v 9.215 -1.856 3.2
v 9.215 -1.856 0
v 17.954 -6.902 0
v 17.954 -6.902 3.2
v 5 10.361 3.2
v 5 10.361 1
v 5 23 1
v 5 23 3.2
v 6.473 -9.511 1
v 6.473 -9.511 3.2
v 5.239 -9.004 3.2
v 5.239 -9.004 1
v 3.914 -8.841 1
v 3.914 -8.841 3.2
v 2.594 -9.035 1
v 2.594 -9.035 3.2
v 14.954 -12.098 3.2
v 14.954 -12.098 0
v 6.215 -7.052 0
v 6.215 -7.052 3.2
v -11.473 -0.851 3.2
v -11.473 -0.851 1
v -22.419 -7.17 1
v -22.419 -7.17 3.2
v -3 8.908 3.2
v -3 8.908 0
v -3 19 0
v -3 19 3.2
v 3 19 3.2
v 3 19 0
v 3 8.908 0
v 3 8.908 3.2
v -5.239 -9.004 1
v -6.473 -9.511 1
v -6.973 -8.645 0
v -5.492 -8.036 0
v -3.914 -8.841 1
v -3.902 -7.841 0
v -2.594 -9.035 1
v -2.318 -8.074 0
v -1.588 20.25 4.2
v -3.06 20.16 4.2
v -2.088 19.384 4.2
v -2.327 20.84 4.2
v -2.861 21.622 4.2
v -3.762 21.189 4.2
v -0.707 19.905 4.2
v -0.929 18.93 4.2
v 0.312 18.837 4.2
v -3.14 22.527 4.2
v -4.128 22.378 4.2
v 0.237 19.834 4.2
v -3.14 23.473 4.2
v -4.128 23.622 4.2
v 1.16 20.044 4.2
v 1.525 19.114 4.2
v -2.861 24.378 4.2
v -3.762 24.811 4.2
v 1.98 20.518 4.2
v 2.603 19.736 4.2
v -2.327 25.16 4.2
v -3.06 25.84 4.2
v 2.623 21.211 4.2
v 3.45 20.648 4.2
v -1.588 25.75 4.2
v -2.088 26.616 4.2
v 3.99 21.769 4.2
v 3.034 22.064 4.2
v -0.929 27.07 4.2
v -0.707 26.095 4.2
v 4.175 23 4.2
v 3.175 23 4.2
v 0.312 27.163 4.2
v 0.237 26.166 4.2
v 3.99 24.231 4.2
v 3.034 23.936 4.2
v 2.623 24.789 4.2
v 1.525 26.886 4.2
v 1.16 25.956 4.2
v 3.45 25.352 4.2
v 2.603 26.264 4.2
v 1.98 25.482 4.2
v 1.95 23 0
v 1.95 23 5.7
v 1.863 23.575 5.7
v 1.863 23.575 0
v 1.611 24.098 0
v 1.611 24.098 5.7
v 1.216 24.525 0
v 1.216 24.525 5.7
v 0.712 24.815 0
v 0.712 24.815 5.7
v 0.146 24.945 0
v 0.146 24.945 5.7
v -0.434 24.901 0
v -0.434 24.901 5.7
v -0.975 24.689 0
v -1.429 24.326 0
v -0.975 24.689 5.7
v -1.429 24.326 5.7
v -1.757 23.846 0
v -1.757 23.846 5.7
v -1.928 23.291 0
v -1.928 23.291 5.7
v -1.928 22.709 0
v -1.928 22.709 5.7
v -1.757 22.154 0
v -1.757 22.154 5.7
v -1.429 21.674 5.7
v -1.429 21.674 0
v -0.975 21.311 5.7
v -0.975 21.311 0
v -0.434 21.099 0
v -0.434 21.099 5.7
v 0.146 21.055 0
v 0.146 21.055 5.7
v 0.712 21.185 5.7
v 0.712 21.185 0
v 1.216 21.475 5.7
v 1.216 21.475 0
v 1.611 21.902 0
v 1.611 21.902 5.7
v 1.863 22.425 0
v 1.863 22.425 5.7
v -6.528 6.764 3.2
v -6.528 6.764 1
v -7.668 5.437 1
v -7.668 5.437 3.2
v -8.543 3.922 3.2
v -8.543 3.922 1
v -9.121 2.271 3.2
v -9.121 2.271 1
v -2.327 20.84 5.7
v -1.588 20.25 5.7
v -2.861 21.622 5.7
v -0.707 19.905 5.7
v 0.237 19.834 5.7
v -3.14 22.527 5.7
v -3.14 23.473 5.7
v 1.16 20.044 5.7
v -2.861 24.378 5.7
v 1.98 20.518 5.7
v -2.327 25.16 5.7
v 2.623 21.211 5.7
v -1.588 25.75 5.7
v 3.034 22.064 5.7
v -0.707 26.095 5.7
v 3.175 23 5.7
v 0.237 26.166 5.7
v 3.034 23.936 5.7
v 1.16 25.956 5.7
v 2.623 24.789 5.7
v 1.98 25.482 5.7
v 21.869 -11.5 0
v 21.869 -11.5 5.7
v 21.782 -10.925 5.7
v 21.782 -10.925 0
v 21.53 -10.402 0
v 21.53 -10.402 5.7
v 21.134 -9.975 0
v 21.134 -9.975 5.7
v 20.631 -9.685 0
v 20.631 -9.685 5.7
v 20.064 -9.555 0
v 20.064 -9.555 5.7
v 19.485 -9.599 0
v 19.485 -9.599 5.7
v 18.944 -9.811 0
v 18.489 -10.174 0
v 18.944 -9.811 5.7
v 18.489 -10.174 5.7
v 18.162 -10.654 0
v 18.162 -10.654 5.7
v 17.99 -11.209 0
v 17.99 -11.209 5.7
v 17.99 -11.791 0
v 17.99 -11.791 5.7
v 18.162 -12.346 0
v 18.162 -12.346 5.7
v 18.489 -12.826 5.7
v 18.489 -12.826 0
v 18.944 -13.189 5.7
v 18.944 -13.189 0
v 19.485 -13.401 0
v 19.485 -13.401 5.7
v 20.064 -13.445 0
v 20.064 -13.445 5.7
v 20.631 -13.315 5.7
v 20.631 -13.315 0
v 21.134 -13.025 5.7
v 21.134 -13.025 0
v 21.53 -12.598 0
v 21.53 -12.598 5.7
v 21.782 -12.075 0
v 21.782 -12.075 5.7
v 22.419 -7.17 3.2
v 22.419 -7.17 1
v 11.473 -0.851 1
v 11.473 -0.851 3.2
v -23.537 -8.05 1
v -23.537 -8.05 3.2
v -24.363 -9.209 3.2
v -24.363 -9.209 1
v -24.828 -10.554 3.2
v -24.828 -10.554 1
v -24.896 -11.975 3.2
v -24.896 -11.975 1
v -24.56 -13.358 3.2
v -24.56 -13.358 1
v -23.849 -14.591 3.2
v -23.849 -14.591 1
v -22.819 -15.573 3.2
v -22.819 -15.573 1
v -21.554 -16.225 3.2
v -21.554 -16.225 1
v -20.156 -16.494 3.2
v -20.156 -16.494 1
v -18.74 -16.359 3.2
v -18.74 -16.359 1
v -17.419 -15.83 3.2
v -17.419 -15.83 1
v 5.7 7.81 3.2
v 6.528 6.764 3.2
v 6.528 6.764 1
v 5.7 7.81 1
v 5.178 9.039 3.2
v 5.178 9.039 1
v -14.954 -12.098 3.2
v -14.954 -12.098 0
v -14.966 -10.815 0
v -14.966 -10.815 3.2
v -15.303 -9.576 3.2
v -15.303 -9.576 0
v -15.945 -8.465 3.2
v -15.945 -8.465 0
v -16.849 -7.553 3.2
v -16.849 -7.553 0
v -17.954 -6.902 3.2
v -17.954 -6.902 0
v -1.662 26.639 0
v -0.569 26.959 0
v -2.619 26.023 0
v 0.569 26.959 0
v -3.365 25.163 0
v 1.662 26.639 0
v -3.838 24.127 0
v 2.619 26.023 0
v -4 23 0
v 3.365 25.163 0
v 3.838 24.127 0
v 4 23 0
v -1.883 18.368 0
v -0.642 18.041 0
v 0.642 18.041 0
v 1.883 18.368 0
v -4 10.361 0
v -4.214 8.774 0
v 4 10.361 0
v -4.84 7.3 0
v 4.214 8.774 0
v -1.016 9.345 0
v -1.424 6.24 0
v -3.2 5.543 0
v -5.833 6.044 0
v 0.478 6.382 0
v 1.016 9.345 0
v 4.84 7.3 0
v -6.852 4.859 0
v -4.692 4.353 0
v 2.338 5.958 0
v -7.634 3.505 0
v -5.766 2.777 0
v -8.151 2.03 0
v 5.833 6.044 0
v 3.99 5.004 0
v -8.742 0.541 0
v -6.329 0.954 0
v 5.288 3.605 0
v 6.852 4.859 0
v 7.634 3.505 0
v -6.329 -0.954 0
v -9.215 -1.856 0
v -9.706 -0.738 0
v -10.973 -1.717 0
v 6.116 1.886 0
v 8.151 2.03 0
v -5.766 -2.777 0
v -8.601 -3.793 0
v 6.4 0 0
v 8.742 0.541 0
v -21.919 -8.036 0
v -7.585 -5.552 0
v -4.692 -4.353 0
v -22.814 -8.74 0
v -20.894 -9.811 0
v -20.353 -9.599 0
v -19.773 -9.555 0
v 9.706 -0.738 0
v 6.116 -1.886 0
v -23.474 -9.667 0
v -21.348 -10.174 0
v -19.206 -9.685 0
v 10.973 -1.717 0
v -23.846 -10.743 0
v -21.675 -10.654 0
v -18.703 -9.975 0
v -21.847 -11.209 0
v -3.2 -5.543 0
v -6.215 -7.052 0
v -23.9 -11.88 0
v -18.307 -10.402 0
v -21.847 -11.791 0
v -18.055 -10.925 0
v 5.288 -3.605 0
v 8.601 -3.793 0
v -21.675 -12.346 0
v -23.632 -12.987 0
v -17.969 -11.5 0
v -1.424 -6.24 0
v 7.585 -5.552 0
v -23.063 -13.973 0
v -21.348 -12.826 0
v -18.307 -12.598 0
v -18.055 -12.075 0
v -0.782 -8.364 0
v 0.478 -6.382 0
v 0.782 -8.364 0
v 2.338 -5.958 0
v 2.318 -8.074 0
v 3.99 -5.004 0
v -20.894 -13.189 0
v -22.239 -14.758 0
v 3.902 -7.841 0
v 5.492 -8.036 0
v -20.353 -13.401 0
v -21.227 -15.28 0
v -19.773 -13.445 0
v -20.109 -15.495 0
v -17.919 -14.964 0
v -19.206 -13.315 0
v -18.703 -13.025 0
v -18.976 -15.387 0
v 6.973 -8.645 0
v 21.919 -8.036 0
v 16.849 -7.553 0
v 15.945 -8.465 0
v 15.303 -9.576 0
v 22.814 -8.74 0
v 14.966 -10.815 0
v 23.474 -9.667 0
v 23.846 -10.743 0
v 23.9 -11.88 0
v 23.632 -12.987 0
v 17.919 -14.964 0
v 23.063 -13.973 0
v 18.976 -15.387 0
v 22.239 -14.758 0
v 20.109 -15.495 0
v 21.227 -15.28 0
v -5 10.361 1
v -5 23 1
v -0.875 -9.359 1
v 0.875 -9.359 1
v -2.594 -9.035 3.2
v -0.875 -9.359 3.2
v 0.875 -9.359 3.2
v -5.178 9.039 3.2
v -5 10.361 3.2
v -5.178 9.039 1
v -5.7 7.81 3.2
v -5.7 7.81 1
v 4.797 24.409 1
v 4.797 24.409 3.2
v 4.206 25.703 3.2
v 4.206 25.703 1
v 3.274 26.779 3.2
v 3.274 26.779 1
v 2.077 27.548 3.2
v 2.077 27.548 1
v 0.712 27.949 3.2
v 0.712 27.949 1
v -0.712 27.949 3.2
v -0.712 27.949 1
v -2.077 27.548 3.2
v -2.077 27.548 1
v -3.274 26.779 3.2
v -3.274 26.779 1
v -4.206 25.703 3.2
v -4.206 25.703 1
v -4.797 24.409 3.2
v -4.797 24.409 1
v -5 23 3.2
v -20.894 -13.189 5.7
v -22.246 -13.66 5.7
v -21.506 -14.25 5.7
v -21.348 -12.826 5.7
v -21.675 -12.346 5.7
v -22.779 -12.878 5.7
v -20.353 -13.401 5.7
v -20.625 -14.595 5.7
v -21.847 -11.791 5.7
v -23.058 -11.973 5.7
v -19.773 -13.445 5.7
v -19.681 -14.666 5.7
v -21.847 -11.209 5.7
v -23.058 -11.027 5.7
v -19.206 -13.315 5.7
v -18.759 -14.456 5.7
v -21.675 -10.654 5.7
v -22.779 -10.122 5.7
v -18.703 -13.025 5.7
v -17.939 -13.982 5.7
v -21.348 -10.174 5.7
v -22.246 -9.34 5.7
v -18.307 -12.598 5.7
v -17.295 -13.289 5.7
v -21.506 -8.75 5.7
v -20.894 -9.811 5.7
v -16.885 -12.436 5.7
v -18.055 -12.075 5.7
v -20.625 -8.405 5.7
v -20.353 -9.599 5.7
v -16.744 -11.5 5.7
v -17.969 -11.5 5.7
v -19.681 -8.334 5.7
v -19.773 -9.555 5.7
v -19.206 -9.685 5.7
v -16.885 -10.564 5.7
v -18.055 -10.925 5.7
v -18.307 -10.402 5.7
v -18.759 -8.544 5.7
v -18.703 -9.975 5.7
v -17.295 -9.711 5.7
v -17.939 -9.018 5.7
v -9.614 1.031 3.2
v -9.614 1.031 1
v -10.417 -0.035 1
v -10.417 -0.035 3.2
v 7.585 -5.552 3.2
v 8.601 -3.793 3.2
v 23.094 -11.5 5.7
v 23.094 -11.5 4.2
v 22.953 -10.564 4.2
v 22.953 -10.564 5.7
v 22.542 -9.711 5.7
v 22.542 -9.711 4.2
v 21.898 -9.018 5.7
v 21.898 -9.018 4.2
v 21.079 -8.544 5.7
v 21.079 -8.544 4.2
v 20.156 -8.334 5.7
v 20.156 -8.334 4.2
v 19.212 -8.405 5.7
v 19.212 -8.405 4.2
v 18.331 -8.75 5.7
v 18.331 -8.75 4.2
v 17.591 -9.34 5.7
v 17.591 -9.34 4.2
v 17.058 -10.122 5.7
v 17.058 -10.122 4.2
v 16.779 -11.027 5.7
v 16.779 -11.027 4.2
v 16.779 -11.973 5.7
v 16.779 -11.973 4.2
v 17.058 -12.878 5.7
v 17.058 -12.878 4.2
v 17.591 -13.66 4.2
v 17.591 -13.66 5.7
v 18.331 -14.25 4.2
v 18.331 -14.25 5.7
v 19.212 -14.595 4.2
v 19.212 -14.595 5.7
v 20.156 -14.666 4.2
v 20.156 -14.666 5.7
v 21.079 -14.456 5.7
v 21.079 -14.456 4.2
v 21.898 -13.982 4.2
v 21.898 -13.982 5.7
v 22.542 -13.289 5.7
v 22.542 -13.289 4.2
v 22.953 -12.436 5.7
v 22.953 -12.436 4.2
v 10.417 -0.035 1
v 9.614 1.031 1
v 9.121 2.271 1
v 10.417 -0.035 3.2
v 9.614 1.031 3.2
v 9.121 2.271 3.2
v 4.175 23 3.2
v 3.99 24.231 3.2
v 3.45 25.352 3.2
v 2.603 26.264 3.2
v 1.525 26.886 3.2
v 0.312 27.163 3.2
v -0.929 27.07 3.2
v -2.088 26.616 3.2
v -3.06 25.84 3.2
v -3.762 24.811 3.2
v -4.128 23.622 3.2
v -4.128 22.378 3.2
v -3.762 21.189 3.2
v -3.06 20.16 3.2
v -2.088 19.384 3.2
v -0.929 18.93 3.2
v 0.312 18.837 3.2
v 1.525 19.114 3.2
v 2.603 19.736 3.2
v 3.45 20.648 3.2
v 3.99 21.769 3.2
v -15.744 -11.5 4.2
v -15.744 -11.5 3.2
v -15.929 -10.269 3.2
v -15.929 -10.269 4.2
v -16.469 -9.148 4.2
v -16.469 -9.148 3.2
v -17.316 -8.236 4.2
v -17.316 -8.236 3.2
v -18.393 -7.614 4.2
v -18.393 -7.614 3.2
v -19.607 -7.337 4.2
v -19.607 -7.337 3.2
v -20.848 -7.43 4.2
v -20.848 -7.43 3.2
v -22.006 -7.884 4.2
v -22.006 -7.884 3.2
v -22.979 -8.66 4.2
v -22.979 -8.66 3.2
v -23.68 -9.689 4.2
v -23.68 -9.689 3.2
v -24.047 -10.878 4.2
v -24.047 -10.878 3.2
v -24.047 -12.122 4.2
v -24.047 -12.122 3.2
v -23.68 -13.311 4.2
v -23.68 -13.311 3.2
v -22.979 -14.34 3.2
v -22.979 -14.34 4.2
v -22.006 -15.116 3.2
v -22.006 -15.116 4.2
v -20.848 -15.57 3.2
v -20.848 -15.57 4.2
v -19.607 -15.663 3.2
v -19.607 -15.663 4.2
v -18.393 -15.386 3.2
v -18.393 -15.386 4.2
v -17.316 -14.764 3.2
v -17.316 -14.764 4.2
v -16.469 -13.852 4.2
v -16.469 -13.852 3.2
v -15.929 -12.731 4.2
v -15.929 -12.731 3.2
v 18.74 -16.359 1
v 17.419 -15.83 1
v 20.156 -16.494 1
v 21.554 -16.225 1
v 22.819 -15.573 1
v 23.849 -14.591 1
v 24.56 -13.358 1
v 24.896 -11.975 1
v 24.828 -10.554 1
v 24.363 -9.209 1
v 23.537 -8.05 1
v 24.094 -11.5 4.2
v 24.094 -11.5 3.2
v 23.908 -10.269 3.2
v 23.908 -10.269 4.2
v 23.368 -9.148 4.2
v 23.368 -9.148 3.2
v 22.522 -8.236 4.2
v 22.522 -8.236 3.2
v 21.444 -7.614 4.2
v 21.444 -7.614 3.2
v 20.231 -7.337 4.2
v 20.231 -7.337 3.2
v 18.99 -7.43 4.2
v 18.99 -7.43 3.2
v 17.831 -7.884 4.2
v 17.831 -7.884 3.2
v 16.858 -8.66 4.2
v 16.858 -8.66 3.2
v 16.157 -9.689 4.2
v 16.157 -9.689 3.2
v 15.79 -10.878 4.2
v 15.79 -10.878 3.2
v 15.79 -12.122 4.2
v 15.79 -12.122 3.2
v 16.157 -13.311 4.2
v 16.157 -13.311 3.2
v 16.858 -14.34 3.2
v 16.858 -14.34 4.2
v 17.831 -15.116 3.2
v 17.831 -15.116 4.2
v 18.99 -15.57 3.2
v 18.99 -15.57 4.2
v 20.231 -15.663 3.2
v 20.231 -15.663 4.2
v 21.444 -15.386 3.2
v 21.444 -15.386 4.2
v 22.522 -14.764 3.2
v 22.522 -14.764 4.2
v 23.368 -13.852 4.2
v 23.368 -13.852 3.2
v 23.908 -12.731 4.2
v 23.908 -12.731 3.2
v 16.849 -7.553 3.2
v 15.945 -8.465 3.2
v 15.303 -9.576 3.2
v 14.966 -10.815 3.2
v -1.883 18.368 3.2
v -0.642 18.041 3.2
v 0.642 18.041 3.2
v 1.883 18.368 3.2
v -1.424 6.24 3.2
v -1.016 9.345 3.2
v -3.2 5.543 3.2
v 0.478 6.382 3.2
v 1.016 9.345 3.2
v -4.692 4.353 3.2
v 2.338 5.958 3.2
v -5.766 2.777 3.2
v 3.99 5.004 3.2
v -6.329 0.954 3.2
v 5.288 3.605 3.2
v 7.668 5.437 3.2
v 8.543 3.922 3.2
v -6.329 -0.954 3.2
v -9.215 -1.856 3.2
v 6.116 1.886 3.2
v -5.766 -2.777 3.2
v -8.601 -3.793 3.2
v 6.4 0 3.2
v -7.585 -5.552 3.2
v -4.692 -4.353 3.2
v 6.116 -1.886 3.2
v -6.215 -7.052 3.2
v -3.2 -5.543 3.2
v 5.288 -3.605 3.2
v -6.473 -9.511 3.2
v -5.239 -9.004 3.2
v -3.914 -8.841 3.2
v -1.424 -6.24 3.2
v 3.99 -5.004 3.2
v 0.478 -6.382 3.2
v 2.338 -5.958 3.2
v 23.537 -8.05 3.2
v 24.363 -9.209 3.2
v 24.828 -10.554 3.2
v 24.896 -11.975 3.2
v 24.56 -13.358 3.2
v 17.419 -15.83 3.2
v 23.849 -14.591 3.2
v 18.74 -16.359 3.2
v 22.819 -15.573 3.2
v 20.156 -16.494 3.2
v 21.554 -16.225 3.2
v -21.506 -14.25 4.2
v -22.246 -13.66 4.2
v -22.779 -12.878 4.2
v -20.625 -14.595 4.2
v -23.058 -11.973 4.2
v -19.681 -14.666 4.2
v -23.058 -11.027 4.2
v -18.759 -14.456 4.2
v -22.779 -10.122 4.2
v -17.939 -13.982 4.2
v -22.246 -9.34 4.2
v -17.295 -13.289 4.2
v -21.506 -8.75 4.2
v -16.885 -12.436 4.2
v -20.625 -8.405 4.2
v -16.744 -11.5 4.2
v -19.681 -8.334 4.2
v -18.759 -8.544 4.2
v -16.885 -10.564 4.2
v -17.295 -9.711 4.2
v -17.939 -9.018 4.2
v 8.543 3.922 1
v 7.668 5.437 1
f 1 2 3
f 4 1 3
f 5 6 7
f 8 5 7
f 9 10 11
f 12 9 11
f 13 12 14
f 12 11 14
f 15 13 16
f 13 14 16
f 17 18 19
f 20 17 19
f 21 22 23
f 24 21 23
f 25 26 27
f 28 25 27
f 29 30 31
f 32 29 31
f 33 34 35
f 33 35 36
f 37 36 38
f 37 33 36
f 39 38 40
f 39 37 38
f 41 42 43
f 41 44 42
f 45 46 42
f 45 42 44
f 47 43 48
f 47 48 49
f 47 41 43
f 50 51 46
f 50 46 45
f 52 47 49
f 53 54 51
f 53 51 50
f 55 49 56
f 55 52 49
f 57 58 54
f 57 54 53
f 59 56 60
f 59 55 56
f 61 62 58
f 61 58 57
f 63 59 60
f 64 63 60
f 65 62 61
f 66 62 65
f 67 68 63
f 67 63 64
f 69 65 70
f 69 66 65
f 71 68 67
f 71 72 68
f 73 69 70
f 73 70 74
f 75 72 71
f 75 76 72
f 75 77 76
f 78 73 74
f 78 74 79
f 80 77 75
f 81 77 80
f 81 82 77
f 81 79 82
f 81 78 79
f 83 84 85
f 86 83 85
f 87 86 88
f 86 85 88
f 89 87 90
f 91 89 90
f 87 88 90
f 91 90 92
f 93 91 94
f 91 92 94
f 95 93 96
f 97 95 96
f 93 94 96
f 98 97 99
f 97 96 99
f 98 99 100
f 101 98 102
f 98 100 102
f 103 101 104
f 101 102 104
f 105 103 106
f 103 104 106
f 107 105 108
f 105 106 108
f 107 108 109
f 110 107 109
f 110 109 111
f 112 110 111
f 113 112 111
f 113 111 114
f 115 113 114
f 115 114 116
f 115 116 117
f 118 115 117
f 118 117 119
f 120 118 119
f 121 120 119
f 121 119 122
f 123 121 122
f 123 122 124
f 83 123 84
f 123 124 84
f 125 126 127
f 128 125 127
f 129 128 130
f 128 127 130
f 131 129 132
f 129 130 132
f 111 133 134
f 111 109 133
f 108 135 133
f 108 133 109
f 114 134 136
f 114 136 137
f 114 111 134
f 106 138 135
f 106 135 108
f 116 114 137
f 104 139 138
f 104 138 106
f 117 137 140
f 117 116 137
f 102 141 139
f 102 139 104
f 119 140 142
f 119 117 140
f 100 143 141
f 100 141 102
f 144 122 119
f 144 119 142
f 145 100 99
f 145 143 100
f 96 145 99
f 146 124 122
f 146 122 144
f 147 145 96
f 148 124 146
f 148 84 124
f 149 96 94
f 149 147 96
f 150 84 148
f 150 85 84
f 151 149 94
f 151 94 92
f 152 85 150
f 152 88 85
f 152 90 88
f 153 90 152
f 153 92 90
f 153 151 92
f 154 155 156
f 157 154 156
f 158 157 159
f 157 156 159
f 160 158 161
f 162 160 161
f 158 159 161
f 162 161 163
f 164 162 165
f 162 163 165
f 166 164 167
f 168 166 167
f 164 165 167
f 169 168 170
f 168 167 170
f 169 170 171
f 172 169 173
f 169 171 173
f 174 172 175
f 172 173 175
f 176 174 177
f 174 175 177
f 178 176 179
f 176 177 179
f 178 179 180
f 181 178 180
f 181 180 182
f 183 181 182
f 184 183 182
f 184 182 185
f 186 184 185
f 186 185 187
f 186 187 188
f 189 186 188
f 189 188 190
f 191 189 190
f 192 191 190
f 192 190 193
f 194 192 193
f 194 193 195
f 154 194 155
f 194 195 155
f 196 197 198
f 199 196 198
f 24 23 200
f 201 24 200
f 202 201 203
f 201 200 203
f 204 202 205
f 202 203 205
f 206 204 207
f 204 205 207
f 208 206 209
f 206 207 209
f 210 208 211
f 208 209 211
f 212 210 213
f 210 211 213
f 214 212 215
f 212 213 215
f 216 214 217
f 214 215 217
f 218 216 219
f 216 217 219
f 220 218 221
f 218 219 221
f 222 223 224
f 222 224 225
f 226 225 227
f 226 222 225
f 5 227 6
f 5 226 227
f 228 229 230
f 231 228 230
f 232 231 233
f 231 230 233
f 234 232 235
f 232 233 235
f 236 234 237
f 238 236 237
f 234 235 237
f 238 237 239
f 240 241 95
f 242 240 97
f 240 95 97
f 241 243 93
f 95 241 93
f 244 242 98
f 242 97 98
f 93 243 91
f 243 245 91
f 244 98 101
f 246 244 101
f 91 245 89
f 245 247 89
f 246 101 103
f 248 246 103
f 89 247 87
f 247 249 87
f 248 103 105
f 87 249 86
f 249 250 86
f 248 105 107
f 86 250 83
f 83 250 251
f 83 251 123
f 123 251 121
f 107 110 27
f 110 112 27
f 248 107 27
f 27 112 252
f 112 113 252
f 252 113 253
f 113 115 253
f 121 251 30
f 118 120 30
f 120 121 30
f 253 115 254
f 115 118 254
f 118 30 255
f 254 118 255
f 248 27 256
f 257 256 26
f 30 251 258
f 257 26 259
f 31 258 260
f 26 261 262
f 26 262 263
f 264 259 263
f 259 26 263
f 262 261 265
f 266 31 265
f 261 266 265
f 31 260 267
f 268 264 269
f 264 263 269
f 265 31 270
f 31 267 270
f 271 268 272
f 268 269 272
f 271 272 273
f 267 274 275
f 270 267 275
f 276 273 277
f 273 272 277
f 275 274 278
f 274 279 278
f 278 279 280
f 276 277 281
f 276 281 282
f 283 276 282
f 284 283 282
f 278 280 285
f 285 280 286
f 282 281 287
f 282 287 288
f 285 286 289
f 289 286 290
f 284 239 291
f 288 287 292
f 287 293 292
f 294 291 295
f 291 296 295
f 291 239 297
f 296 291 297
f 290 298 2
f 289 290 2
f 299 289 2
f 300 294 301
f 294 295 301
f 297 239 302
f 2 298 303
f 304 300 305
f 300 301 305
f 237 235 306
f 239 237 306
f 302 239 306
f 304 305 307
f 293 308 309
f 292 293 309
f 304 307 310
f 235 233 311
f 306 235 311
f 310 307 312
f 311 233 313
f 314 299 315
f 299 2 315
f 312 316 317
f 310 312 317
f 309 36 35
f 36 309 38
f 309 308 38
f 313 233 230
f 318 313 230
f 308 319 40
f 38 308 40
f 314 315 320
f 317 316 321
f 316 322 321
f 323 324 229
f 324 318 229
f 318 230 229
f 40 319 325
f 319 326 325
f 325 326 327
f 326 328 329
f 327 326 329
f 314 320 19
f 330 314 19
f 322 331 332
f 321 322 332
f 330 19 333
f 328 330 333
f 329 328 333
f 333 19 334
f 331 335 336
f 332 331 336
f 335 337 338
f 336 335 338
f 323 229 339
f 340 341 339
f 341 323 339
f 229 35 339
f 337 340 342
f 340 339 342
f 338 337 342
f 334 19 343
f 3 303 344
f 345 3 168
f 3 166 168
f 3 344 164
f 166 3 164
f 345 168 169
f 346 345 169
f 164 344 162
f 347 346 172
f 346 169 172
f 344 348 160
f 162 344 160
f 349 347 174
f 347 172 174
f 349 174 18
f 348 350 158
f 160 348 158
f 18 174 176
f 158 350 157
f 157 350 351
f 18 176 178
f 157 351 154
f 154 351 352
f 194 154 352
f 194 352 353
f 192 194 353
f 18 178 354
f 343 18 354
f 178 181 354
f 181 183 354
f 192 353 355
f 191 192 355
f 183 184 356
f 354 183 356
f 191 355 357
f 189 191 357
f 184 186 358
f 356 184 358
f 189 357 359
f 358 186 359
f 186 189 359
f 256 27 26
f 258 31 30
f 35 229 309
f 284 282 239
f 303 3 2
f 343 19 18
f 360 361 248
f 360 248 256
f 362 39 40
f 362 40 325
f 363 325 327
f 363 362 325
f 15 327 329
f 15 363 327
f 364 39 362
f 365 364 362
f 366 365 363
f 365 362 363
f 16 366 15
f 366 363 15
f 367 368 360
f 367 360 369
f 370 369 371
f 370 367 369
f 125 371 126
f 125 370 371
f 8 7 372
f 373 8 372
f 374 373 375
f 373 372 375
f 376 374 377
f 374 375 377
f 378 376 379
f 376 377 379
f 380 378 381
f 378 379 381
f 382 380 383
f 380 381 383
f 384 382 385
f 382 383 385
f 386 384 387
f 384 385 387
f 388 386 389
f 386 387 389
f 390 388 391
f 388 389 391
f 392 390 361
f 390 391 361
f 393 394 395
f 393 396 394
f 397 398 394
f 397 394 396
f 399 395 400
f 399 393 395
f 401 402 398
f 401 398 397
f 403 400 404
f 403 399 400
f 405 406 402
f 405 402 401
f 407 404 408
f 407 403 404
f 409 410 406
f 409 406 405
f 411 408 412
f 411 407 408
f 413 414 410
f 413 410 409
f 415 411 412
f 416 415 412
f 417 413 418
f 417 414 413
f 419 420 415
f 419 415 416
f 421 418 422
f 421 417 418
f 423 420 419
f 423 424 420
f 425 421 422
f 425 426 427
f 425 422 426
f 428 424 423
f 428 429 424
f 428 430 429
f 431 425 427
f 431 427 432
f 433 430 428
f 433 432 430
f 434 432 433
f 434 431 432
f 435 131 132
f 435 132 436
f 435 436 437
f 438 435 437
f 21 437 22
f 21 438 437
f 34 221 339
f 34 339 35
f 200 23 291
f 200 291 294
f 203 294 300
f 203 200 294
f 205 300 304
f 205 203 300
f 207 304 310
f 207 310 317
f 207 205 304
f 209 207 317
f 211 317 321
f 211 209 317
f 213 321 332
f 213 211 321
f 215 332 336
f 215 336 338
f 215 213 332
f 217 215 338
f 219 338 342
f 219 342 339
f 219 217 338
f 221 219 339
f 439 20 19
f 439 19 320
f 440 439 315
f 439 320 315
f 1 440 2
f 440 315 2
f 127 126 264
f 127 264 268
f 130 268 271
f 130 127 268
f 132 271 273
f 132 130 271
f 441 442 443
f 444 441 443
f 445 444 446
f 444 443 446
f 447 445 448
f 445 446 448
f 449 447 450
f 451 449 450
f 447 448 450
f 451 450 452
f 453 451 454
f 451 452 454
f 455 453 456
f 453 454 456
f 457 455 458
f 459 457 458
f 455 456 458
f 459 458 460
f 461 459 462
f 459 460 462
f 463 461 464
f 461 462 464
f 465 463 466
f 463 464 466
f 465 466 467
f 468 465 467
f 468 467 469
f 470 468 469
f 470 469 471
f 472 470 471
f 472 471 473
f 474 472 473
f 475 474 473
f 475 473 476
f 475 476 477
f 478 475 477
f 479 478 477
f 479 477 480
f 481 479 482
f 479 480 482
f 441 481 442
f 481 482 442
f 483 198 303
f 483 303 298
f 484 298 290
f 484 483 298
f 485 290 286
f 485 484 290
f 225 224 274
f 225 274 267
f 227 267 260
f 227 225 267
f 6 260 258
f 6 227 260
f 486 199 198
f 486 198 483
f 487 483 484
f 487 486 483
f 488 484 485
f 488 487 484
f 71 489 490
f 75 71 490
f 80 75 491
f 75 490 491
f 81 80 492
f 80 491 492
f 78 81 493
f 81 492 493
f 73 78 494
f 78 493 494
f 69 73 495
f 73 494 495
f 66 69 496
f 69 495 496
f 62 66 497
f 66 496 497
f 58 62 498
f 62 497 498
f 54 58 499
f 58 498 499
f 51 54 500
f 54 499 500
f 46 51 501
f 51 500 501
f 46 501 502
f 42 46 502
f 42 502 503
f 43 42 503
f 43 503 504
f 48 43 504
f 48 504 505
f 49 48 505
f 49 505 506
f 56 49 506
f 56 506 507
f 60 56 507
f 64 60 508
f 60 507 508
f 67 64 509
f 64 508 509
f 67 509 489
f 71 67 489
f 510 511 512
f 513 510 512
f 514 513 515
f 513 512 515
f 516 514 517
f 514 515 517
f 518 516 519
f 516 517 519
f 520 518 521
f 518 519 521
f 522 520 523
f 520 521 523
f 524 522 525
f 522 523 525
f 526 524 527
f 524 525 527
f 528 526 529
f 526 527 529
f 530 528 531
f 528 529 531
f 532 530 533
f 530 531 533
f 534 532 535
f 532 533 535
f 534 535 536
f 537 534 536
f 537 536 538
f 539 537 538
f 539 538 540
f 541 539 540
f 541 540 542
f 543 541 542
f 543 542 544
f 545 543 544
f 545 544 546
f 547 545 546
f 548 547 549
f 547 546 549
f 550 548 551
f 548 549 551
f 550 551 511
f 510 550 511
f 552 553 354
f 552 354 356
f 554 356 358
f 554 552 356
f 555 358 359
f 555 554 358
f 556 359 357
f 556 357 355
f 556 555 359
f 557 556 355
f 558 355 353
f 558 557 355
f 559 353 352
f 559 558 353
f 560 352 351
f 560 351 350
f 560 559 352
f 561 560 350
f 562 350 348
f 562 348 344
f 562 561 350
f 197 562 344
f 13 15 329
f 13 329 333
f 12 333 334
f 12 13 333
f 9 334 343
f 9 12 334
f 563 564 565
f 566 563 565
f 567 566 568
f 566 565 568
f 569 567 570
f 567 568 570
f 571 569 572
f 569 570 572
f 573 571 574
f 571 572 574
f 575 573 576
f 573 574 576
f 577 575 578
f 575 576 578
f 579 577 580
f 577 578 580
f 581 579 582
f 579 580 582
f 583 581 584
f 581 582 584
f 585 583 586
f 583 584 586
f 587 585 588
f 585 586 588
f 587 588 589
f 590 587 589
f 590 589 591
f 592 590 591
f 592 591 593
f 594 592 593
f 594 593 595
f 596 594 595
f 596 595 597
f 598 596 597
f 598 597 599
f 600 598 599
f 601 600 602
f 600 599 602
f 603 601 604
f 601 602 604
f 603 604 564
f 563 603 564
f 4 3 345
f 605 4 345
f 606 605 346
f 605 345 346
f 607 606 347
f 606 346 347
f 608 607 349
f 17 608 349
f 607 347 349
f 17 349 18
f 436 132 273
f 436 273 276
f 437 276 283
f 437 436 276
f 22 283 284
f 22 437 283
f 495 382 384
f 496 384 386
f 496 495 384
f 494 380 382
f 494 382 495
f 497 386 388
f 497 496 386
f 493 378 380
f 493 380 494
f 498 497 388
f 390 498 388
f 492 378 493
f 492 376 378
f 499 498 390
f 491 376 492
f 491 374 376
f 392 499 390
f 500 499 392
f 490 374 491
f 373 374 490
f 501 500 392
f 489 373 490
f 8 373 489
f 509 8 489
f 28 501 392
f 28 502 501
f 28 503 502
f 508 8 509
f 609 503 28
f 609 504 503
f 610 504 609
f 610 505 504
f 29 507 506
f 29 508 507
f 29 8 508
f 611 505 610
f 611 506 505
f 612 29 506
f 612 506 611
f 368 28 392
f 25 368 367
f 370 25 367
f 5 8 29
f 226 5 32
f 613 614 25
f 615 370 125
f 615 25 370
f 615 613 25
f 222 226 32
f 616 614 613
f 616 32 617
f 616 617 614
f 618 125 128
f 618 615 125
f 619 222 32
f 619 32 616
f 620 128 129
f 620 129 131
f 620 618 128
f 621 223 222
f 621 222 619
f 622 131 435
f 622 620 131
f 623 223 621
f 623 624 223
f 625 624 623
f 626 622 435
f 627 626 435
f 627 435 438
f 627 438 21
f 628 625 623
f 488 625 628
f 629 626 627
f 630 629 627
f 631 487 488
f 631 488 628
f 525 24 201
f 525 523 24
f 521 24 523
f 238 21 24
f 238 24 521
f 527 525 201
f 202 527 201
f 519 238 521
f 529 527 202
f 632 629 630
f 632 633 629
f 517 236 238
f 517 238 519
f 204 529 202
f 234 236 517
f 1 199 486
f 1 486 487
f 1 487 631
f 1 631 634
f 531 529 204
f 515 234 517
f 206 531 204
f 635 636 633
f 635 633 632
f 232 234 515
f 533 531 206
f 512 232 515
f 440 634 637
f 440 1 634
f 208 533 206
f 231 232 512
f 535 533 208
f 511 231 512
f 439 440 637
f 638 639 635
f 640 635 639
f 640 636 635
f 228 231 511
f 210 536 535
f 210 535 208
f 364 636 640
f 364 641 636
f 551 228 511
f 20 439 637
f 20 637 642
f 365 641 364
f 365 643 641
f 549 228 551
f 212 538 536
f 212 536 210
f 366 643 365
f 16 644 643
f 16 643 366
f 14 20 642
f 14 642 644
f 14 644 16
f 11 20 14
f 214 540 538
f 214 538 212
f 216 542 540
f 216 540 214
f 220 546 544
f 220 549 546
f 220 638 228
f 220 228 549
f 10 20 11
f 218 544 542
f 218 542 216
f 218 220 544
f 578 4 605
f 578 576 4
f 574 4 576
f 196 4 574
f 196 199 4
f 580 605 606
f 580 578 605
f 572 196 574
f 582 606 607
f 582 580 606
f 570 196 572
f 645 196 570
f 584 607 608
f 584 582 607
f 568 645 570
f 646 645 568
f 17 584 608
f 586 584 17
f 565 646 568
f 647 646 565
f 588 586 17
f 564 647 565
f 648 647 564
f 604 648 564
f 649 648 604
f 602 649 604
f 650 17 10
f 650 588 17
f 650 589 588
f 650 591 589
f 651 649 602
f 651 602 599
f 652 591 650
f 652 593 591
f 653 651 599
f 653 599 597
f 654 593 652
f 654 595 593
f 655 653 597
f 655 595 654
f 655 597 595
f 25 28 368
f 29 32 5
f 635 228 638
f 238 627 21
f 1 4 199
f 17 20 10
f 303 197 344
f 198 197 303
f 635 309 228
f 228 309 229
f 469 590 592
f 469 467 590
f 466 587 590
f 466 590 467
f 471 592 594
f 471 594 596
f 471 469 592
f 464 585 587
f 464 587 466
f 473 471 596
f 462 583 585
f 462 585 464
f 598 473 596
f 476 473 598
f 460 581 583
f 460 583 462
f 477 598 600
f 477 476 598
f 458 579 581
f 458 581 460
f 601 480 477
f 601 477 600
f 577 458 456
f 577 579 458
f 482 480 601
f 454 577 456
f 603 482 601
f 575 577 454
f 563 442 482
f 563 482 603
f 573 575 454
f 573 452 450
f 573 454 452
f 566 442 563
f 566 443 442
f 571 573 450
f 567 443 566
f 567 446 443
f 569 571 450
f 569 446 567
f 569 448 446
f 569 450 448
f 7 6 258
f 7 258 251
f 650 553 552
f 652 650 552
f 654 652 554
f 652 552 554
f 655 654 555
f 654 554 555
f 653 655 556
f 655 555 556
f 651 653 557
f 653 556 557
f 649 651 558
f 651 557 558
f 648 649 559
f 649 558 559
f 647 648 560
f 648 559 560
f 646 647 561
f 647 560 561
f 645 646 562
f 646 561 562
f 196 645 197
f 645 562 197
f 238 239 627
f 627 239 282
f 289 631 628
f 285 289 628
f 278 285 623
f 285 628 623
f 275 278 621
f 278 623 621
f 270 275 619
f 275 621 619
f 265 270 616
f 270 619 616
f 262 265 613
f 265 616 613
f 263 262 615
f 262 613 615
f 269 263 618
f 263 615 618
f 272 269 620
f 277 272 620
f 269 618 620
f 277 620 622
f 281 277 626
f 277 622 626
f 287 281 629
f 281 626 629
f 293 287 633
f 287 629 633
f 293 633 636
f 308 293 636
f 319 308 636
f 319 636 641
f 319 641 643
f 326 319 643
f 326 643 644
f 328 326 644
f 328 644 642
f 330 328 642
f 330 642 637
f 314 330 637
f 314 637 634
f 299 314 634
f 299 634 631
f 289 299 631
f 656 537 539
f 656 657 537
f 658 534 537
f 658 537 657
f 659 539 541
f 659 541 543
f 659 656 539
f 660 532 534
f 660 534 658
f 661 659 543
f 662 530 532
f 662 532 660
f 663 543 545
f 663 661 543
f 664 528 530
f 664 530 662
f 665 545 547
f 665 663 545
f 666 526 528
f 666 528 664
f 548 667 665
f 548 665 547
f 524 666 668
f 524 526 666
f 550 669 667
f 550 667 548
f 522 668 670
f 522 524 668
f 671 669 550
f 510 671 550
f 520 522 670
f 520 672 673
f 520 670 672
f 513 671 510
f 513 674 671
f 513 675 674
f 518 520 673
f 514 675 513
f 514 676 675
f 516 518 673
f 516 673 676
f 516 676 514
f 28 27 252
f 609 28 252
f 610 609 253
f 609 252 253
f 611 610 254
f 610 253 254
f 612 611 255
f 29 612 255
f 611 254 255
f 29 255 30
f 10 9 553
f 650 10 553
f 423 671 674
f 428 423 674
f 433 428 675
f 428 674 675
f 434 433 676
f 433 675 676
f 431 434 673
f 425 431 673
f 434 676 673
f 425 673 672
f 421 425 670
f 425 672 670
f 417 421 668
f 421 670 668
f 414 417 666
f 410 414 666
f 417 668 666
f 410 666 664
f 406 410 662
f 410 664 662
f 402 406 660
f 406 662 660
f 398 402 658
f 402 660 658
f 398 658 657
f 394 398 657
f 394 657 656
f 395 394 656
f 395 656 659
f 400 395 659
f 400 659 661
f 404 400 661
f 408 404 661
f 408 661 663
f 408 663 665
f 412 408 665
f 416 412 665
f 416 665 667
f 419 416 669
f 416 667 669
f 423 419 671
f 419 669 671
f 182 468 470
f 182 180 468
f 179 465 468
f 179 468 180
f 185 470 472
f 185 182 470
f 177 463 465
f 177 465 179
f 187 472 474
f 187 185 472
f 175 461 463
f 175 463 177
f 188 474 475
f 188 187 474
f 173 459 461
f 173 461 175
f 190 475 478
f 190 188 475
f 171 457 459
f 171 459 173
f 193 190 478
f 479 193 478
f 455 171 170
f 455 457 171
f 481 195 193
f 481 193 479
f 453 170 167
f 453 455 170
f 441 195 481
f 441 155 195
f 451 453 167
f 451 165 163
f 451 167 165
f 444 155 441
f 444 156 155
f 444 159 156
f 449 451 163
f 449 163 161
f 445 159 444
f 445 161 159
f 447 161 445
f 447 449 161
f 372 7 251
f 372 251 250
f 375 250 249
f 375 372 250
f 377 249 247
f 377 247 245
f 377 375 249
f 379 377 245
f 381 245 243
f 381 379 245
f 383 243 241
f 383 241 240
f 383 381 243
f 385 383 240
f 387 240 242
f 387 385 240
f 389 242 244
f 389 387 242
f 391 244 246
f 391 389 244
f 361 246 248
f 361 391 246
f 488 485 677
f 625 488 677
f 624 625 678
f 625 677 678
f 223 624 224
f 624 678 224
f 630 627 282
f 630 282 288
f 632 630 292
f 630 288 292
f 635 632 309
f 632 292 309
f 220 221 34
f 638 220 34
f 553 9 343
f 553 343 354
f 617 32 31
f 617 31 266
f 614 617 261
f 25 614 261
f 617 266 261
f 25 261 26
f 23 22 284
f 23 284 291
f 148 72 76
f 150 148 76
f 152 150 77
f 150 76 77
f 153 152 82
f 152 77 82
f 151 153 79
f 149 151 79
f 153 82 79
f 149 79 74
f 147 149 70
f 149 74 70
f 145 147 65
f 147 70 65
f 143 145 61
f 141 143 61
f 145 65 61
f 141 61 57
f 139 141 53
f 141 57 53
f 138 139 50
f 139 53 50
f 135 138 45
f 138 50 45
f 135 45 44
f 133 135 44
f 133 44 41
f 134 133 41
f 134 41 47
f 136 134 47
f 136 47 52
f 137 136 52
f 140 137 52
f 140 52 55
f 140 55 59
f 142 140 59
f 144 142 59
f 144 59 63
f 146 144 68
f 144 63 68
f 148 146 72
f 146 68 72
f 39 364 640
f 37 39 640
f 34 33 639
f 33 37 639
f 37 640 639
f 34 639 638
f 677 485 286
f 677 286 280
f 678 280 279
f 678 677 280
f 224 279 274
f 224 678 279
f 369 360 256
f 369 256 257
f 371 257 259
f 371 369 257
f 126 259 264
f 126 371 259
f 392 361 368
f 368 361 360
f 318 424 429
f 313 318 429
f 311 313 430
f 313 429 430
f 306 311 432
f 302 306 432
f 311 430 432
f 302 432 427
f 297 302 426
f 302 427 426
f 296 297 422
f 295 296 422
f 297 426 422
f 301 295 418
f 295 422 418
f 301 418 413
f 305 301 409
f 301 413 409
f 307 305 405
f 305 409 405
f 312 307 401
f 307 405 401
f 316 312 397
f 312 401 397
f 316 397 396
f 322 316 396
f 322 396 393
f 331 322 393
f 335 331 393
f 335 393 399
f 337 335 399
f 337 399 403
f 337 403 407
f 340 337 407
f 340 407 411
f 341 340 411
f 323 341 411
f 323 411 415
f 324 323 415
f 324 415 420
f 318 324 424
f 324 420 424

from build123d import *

# Parameters (mm, degrees)
F1_DEPTH  = 3.2
F3_COUNT  = 3
F4_R      = 4.175
F5_DEPTH  = 1
F6_R      = 3.175
F7_DEPTH  = 1.5
F8_R      = 1.95
F9_DEPTH  = 5.7
F10_R     = 6.4
F11_DEPTH = 25
F12_R     = 5
F13_SIZE  = 1


with BuildPart() as f1:
    # F0 (on Top) → F1 (new body)
    with BuildSketch(Plane.XY):
        with BuildLine():
            Line((-3, 8.9084229805), (-3, 19))
            ThreePointArc((-3, 19), (0, 18), (3, 19))
            Line((3, 19), (3, 8.9084229805))
            ThreePointArc((3, 8.9084229805), (4.0280174031, 8.4932370625), (5, 7.9598994969))
            Line((5, 7.9598994969), (5, 23))
            ThreePointArc((5, 23), (0, 28), (-5, 23))
            Line((-5, 23), (-5, 7.9598994969))
            ThreePointArc((-5, 7.9598994969), (-4.0280174031, 8.4932370625), (-3, 8.9084229805))
        make_face()
        with BuildLine():
            Line((-3, 7.5055534995), (-3, 8.9084229805))
            ThreePointArc((-3, 8.9084229805), (-4.0280174031, 8.4932370625), (-5, 7.9598994969))
            Line((-5, 7.9598994969), (-5, 2.8867513459))
            Line((-5, 2.8867513459), (0, 0))
            Line((0, 0), (5, 2.8867513459))
            Line((5, 2.8867513459), (5, 7.9598994969))
            ThreePointArc((5, 7.9598994969), (4.0280174031, 8.4932370625), (3, 8.9084229805))
            Line((3, 8.9084229805), (3, 7.5055534995))
            Line((3, 7.5055534995), (0, 5.7735026919))
            Line((0, 5.7735026919), (-3, 7.5055534995))
        make_face()
        with BuildLine():
            Line((-5, 2.8867513459), (-5, 7.9598994969))
            ThreePointArc((-5, 7.9598994969), (-4.5475268004, -8.2267855205), (9.4, 0))
            ThreePointArc((9.4, 0), (8.2267855205, 4.5475268004), (5, 7.9598994969))
            Line((5, 7.9598994969), (5, 2.8867513459))
            Line((5, 2.8867513459), (0, 0))
            Line((0, 0), (-5, 2.8867513459))
        make_face()
    extrude(amount=F1_DEPTH)

    # F3: F1 ×3 about axis
    f3_axis = Axis((0, 0, 19.5818599313), (0, 0, 1))


with BuildPart() as f1_1:
    add(f1.part)
    for i in range(1, F3_COUNT):
        add(f1.part.rotate(f3_axis, i * 360 / F3_COUNT))

    # F4 (on face) → F5 (join)
    with BuildSketch(Plane.XY.offset(3.2)):
        with Locations((0, 23)):
            Circle(F4_R)
        with Locations((-19.918584287, -11.5)):
            Circle(F4_R)
        with Locations((19.918584287, -11.5)):
            Circle(F4_R)
    extrude(amount=F5_DEPTH)

    # F6 (on face) → F7 (join)
    with BuildSketch(Plane.XY.offset(4.2)):
        with Locations((0, 23)):
            Circle(F6_R)
        with Locations((-19.918584287, -11.5)):
            Circle(F6_R)
        with Locations((19.918584287, -11.5)):
            Circle(F6_R)
    extrude(amount=F7_DEPTH)

    # F8 (on face) → F9 (cut, through all)
    with BuildSketch(Plane.XY.offset(5.7)):
        with Locations((0, 23)):
            Circle(F8_R)
        with Locations((-19.918584287, -11.5)):
            Circle(F8_R)
        with Locations((19.918584287, -11.5)):
            Circle(F8_R)
    extrude(amount=-F9_DEPTH, mode=Mode.SUBTRACT)

    # F10 (on face) → F11 (cut)
    with BuildSketch(Plane.XY.offset(3.2)):
        Circle(F10_R)
    extrude(amount=-F11_DEPTH, mode=Mode.SUBTRACT)

    # F12
    f12_edges = [f1_1.edges().sort_by_distance(p)[0] for p in [
        (-5, 7.959899, 1.6),
        (-9.393475, 0.350177, 1.6),
        (-4.393475, -8.310077, 1.6),
        (4.393475, -8.310077, 1.6),
        (9.393475, 0.350177, 1.6),
        (5, 7.959899, 1.6),
    ]]
    fillet(f12_edges, radius=F12_R)

    # F13
    f13_edges = [f1_1.edges().sort_by_distance(p)[0] for p in [
        (-24.248711, -14, 0),
    ]]
    chamfer(f13_edges, length=F13_SIZE)


solid = f1_1.part
